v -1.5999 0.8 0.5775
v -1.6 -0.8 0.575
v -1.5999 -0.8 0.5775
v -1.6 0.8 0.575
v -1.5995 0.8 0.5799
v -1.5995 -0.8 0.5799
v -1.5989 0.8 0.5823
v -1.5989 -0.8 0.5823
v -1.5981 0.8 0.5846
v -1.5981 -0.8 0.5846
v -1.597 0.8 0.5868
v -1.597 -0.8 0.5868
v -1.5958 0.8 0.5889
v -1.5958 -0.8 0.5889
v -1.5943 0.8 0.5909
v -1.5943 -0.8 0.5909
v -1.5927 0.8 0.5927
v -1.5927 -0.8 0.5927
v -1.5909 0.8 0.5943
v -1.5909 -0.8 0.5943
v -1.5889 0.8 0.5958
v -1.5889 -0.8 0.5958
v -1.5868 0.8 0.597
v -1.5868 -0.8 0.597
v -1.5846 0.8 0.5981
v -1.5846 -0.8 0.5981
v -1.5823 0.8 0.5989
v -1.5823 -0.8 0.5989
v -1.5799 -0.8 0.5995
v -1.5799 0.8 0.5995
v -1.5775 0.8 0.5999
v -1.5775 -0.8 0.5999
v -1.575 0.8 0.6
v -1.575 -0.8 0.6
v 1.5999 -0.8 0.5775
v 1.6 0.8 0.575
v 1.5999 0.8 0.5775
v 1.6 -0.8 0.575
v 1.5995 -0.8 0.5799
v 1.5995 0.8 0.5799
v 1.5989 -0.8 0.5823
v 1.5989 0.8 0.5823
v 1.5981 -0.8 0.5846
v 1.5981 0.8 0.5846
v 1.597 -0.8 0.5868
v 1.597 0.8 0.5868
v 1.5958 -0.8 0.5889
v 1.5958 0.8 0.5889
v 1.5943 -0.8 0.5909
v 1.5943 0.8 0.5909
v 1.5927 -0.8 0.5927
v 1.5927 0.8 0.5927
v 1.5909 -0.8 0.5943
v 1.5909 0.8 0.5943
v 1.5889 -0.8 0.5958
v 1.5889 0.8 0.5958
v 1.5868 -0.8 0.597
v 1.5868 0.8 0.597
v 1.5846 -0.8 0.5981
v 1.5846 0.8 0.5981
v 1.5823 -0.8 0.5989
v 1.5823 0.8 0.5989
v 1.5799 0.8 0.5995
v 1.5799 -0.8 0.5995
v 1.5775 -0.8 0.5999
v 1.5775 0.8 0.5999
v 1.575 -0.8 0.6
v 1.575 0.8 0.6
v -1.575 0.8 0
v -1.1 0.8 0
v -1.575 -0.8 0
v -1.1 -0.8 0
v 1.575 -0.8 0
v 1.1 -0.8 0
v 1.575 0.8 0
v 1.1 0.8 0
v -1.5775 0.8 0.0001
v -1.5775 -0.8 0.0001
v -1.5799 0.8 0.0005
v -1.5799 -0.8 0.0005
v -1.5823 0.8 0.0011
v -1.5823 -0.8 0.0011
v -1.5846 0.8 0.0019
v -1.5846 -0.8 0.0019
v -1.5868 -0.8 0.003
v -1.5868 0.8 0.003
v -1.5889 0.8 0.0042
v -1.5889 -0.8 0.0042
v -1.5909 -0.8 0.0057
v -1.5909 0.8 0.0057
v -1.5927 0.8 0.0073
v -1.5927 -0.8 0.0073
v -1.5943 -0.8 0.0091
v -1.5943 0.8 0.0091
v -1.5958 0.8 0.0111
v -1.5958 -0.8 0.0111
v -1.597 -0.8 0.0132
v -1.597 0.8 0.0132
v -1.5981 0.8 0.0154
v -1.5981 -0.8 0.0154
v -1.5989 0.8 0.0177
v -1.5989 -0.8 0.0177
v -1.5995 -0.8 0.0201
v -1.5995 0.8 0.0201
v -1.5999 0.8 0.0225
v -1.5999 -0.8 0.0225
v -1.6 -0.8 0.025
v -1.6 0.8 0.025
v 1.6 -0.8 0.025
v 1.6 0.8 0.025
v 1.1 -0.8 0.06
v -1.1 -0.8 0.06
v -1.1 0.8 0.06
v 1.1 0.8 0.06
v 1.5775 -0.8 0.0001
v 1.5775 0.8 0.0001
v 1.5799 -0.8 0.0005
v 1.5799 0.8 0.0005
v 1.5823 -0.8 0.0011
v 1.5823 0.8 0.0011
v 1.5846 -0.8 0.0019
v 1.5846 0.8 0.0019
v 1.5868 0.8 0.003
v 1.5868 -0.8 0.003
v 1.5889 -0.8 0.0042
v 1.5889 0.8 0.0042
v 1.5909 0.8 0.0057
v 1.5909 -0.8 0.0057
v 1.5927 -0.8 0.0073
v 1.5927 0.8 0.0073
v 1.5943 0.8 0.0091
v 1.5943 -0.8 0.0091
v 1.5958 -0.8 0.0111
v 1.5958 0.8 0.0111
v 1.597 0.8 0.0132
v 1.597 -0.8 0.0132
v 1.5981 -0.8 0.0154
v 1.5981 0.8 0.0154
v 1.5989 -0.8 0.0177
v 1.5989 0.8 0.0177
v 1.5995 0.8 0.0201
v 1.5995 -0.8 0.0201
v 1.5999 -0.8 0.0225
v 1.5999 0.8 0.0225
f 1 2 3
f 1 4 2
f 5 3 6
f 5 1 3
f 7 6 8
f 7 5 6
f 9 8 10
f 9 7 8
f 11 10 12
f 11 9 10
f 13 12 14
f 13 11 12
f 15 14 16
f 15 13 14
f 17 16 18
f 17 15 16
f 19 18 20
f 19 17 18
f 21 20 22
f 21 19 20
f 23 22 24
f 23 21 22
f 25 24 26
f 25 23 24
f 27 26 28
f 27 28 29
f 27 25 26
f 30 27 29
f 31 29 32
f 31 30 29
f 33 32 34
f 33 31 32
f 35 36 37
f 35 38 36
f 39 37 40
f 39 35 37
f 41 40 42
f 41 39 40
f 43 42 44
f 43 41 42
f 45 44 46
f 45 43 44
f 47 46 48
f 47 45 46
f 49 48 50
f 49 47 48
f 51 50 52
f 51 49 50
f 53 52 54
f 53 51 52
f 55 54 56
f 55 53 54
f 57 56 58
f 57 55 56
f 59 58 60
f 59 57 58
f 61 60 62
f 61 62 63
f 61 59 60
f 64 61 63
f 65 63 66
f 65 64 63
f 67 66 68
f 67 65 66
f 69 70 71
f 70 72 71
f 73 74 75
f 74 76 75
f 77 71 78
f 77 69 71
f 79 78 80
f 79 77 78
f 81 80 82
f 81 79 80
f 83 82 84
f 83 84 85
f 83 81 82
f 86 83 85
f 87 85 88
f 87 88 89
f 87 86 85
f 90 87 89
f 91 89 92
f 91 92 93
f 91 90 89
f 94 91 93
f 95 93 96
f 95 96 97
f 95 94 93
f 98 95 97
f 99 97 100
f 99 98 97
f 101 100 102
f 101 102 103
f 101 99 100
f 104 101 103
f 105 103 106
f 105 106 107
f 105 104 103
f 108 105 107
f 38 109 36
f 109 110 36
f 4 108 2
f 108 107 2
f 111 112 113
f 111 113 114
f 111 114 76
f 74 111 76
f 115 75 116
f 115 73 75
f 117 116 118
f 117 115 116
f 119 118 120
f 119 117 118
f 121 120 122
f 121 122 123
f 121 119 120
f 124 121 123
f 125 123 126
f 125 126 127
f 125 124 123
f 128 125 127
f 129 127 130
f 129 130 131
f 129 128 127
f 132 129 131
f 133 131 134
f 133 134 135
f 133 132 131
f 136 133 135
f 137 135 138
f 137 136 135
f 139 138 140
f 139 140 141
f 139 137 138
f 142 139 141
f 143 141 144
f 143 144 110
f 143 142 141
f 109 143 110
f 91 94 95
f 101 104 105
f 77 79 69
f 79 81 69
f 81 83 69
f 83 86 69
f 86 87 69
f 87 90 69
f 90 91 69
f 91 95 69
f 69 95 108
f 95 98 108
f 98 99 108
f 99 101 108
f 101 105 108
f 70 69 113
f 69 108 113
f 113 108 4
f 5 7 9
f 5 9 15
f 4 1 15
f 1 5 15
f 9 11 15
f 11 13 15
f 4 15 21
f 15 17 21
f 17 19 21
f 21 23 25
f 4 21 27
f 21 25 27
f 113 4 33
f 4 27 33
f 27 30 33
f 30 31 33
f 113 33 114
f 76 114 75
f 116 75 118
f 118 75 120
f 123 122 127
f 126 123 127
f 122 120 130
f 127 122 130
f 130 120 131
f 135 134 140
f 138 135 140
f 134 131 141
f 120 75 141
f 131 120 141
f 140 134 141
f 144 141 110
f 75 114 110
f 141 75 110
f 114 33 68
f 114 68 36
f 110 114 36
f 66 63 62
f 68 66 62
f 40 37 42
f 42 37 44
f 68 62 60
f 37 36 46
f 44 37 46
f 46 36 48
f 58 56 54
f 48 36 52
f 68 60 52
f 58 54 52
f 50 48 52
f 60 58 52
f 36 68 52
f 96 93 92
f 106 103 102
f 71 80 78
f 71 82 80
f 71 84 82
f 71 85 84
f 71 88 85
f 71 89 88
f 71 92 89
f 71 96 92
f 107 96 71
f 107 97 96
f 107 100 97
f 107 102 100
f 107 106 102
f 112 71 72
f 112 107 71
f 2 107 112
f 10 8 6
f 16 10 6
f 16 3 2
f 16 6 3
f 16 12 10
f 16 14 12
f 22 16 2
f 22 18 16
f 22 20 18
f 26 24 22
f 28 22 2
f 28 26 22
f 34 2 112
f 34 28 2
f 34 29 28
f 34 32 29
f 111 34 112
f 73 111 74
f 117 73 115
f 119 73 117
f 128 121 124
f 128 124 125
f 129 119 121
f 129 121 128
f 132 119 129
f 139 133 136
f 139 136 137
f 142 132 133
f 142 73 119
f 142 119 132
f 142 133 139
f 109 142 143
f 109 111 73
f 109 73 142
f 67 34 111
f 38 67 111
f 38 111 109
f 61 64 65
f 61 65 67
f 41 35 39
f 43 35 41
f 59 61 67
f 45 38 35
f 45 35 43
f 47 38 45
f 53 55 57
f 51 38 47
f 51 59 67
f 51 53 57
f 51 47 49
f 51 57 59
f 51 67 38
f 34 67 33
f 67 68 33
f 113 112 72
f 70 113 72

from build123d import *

# Parameters (mm, degrees)
SKETCH002_W             = 3.08
SKETCH002_H             = 0.48
PAD001_DEPTH            = 0.8
PAD_DEPTH               = 0.8
FILLET_R                = 0.025
BODY002_PLACEMENT_ANGLE = 180
SKETCH003_W             = 2.2
SKETCH003_H             = 1.6
PAD002_DEPTH            = 0.06


with BuildPart() as substrate:
    # Sketch002 → Pad001 (new body, symmetric)
    with BuildSketch(Plane.XZ):
        with Locations((0, 0.3)):
            Rectangle(SKETCH002_W, SKETCH002_H)
    extrude(amount=PAD001_DEPTH, both=True)


with BuildPart() as body001:
    # Sketch001 → Pad (new body, symmetric)
    with BuildSketch(Plane.XZ):
        Polygon((-1.1, 0), (-1.6, 0), (-1.6, 0.6), (-1.1, 0.6), (-1.1, 0.54), (-1.54, 0.54), (-1.54, 0.06), (-1.1, 0.06), align=None)
    pad = extrude(amount=PAD_DEPTH, both=True)

    # Mirrored: Pad across XZ
    add(pad.mirror(Plane.XZ))

    # Fillet
    fillet_edges = [body001.edges().sort_by_distance(p)[0] for p in [
        (-1.6, 0, 0.6),
        (-1.6, 0, 0),
    ]]
    fillet(fillet_edges, radius=FILLET_R)


with BuildPart() as body002:
    # Body002 base: copy of Body001
    add(body001.part)


with BuildPart() as body002_1:
    # Body002 placement: moved
    add(body002.part.rotate(Axis((0, 0, 0), (0, 0, 1)), BODY002_PLACEMENT_ANGLE))


with BuildPart() as r_1206_3216m:
    # Sketch003 → Pad002 (new body)
    with BuildSketch(Plane.XY.offset(0.54)):
        Rectangle(SKETCH003_W, SKETCH003_H)
    extrude(amount=PAD002_DEPTH)

    # Fusion: union Substrate, Body001, Body002
    add(substrate.part)
    add(body001.part)
    add(body002_1.part)


solid = r_1206_3216m.part
